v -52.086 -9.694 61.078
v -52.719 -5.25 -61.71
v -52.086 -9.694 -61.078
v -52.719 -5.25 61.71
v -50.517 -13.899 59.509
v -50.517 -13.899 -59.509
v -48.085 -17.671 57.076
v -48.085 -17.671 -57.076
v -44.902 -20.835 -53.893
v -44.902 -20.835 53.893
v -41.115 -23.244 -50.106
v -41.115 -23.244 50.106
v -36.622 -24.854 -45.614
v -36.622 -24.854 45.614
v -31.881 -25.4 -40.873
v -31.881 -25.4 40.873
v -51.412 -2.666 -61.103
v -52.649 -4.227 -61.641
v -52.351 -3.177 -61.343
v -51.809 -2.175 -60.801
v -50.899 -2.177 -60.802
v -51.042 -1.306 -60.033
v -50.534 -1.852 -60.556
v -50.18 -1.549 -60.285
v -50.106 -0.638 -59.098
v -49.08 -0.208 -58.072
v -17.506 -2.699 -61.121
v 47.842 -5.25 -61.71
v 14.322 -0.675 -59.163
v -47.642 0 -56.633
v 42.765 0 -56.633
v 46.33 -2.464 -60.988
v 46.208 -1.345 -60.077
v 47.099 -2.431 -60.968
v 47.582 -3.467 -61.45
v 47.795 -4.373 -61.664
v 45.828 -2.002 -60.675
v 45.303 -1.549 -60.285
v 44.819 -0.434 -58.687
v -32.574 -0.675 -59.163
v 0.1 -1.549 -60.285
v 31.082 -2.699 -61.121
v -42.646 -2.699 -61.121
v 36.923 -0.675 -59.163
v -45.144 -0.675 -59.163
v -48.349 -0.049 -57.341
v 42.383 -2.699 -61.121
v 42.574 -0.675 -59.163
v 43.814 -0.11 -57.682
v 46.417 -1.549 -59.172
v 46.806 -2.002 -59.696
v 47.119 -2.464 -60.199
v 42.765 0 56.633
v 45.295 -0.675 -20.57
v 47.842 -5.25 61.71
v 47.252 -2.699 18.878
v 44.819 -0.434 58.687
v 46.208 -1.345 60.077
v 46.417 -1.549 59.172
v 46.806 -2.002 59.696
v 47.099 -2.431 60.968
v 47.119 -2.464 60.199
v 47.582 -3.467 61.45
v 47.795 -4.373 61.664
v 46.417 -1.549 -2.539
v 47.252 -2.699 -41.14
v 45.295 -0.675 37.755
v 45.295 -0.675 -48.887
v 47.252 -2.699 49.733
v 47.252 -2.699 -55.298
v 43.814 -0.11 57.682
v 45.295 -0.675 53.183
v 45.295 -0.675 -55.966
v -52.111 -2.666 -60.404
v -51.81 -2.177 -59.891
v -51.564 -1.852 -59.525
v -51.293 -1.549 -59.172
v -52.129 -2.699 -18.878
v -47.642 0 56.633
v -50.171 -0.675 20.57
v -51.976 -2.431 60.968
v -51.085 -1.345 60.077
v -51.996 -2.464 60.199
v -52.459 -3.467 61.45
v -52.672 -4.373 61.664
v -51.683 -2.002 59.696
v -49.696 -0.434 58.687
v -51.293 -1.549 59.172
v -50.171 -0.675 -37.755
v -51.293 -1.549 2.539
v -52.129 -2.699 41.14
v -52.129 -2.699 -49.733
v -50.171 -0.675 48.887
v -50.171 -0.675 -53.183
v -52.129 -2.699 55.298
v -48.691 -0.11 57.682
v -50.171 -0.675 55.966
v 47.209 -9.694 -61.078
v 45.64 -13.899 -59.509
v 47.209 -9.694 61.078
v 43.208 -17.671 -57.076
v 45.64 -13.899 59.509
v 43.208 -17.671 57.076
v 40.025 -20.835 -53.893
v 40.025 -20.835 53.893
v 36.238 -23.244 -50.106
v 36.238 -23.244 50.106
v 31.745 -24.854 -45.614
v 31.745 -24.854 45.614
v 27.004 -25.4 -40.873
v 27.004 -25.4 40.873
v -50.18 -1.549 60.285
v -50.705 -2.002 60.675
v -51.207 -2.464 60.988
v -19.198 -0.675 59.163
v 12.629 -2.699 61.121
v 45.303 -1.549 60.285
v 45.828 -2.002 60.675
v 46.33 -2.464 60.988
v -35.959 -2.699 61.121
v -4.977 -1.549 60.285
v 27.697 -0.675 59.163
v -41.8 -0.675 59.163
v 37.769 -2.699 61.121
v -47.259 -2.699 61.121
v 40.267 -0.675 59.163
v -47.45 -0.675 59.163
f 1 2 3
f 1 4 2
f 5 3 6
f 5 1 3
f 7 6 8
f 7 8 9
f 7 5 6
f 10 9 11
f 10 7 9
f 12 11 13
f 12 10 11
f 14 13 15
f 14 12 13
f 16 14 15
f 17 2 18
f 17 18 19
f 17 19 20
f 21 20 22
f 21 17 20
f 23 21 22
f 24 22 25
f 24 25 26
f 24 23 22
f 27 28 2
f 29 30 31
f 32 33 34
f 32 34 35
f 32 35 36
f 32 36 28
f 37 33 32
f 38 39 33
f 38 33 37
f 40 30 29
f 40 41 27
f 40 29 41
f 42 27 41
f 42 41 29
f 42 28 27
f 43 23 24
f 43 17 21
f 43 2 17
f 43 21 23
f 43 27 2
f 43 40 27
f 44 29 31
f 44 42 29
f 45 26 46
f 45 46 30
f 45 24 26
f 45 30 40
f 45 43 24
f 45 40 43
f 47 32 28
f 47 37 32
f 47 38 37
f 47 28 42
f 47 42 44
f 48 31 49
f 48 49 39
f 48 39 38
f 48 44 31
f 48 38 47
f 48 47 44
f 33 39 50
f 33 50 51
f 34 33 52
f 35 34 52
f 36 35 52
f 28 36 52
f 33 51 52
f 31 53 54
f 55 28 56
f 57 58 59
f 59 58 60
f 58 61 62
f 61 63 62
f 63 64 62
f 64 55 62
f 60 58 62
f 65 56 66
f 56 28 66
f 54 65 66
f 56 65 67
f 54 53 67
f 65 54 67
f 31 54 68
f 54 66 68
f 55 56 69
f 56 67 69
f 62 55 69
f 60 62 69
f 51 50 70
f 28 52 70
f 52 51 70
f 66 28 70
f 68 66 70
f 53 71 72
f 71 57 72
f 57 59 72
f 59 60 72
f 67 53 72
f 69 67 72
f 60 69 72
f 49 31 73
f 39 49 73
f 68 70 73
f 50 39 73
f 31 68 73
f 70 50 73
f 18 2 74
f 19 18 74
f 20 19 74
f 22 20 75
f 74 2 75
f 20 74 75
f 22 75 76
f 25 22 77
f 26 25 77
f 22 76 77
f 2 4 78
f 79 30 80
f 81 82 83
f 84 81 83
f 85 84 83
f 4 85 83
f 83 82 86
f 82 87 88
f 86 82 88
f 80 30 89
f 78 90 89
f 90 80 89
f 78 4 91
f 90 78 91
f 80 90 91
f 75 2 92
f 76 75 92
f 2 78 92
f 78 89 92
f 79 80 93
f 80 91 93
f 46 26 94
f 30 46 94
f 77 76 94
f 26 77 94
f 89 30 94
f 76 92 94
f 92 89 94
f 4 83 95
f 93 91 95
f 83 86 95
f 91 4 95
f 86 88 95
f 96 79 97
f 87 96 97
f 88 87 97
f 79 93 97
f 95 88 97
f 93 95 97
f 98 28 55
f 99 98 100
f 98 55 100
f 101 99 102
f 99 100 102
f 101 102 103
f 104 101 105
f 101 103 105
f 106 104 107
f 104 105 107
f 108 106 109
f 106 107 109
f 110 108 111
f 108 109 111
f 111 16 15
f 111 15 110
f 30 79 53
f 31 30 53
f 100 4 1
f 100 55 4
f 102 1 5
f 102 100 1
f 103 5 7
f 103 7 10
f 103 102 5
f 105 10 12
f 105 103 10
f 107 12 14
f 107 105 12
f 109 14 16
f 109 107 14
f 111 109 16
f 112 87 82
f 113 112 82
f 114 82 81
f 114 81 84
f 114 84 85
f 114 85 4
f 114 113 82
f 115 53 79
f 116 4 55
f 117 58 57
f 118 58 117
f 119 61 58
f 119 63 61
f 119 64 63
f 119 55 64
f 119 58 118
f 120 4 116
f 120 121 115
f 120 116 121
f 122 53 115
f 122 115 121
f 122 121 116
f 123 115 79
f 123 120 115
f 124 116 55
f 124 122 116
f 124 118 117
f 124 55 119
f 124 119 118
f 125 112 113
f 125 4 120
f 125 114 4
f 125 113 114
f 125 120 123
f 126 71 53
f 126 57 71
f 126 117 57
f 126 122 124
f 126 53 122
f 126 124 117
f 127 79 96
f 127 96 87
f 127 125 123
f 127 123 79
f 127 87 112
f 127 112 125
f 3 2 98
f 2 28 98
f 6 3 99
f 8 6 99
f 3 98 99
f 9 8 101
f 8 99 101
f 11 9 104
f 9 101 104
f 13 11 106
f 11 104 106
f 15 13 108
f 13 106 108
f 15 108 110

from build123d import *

# Parameters (mm, degrees)
F0_W     = 100.584
F0_H     = 123.444006
F1_DEPTH = 25.4
F2_R     = 20.849148
F3_R     = 5.08


with BuildPart() as f1:
    # F0 (on Front) → F1 (new body)
    with BuildSketch(Plane.XZ):
        with Locations((-2.4384, 0)):
            Rectangle(F0_W, F0_H)
    extrude(amount=F1_DEPTH)

    # F2
    f2_edges = [f1.edges().sort_by_distance(p)[0] for p in [
        (47.8536, -25.4, 0),
        (-2.4384, -25.4, 61.722003),
        (-52.7304, -25.4, 0),
        (-2.4384, -25.4, -61.722003),
    ]]
    fillet(f2_edges, radius=F2_R)

    # F3
    f3_edges = [f1.edges().sort_by_distance(p)[0] for p in [
        (47.8536, 0, 0),
        (-2.4384, 0, 61.722003),
        (-52.7304, 0, 0),
        (-2.4384, 0, -61.722003),
        (27.004452, -25.4, 0),
        (-2.4384, -25.4, -40.872855),
        (-2.4384, -25.4, 40.872855),
        (-31.881252, -25.4, 0),
    ]]
    fillet(f3_edges, radius=F3_R)


solid = f1.part
